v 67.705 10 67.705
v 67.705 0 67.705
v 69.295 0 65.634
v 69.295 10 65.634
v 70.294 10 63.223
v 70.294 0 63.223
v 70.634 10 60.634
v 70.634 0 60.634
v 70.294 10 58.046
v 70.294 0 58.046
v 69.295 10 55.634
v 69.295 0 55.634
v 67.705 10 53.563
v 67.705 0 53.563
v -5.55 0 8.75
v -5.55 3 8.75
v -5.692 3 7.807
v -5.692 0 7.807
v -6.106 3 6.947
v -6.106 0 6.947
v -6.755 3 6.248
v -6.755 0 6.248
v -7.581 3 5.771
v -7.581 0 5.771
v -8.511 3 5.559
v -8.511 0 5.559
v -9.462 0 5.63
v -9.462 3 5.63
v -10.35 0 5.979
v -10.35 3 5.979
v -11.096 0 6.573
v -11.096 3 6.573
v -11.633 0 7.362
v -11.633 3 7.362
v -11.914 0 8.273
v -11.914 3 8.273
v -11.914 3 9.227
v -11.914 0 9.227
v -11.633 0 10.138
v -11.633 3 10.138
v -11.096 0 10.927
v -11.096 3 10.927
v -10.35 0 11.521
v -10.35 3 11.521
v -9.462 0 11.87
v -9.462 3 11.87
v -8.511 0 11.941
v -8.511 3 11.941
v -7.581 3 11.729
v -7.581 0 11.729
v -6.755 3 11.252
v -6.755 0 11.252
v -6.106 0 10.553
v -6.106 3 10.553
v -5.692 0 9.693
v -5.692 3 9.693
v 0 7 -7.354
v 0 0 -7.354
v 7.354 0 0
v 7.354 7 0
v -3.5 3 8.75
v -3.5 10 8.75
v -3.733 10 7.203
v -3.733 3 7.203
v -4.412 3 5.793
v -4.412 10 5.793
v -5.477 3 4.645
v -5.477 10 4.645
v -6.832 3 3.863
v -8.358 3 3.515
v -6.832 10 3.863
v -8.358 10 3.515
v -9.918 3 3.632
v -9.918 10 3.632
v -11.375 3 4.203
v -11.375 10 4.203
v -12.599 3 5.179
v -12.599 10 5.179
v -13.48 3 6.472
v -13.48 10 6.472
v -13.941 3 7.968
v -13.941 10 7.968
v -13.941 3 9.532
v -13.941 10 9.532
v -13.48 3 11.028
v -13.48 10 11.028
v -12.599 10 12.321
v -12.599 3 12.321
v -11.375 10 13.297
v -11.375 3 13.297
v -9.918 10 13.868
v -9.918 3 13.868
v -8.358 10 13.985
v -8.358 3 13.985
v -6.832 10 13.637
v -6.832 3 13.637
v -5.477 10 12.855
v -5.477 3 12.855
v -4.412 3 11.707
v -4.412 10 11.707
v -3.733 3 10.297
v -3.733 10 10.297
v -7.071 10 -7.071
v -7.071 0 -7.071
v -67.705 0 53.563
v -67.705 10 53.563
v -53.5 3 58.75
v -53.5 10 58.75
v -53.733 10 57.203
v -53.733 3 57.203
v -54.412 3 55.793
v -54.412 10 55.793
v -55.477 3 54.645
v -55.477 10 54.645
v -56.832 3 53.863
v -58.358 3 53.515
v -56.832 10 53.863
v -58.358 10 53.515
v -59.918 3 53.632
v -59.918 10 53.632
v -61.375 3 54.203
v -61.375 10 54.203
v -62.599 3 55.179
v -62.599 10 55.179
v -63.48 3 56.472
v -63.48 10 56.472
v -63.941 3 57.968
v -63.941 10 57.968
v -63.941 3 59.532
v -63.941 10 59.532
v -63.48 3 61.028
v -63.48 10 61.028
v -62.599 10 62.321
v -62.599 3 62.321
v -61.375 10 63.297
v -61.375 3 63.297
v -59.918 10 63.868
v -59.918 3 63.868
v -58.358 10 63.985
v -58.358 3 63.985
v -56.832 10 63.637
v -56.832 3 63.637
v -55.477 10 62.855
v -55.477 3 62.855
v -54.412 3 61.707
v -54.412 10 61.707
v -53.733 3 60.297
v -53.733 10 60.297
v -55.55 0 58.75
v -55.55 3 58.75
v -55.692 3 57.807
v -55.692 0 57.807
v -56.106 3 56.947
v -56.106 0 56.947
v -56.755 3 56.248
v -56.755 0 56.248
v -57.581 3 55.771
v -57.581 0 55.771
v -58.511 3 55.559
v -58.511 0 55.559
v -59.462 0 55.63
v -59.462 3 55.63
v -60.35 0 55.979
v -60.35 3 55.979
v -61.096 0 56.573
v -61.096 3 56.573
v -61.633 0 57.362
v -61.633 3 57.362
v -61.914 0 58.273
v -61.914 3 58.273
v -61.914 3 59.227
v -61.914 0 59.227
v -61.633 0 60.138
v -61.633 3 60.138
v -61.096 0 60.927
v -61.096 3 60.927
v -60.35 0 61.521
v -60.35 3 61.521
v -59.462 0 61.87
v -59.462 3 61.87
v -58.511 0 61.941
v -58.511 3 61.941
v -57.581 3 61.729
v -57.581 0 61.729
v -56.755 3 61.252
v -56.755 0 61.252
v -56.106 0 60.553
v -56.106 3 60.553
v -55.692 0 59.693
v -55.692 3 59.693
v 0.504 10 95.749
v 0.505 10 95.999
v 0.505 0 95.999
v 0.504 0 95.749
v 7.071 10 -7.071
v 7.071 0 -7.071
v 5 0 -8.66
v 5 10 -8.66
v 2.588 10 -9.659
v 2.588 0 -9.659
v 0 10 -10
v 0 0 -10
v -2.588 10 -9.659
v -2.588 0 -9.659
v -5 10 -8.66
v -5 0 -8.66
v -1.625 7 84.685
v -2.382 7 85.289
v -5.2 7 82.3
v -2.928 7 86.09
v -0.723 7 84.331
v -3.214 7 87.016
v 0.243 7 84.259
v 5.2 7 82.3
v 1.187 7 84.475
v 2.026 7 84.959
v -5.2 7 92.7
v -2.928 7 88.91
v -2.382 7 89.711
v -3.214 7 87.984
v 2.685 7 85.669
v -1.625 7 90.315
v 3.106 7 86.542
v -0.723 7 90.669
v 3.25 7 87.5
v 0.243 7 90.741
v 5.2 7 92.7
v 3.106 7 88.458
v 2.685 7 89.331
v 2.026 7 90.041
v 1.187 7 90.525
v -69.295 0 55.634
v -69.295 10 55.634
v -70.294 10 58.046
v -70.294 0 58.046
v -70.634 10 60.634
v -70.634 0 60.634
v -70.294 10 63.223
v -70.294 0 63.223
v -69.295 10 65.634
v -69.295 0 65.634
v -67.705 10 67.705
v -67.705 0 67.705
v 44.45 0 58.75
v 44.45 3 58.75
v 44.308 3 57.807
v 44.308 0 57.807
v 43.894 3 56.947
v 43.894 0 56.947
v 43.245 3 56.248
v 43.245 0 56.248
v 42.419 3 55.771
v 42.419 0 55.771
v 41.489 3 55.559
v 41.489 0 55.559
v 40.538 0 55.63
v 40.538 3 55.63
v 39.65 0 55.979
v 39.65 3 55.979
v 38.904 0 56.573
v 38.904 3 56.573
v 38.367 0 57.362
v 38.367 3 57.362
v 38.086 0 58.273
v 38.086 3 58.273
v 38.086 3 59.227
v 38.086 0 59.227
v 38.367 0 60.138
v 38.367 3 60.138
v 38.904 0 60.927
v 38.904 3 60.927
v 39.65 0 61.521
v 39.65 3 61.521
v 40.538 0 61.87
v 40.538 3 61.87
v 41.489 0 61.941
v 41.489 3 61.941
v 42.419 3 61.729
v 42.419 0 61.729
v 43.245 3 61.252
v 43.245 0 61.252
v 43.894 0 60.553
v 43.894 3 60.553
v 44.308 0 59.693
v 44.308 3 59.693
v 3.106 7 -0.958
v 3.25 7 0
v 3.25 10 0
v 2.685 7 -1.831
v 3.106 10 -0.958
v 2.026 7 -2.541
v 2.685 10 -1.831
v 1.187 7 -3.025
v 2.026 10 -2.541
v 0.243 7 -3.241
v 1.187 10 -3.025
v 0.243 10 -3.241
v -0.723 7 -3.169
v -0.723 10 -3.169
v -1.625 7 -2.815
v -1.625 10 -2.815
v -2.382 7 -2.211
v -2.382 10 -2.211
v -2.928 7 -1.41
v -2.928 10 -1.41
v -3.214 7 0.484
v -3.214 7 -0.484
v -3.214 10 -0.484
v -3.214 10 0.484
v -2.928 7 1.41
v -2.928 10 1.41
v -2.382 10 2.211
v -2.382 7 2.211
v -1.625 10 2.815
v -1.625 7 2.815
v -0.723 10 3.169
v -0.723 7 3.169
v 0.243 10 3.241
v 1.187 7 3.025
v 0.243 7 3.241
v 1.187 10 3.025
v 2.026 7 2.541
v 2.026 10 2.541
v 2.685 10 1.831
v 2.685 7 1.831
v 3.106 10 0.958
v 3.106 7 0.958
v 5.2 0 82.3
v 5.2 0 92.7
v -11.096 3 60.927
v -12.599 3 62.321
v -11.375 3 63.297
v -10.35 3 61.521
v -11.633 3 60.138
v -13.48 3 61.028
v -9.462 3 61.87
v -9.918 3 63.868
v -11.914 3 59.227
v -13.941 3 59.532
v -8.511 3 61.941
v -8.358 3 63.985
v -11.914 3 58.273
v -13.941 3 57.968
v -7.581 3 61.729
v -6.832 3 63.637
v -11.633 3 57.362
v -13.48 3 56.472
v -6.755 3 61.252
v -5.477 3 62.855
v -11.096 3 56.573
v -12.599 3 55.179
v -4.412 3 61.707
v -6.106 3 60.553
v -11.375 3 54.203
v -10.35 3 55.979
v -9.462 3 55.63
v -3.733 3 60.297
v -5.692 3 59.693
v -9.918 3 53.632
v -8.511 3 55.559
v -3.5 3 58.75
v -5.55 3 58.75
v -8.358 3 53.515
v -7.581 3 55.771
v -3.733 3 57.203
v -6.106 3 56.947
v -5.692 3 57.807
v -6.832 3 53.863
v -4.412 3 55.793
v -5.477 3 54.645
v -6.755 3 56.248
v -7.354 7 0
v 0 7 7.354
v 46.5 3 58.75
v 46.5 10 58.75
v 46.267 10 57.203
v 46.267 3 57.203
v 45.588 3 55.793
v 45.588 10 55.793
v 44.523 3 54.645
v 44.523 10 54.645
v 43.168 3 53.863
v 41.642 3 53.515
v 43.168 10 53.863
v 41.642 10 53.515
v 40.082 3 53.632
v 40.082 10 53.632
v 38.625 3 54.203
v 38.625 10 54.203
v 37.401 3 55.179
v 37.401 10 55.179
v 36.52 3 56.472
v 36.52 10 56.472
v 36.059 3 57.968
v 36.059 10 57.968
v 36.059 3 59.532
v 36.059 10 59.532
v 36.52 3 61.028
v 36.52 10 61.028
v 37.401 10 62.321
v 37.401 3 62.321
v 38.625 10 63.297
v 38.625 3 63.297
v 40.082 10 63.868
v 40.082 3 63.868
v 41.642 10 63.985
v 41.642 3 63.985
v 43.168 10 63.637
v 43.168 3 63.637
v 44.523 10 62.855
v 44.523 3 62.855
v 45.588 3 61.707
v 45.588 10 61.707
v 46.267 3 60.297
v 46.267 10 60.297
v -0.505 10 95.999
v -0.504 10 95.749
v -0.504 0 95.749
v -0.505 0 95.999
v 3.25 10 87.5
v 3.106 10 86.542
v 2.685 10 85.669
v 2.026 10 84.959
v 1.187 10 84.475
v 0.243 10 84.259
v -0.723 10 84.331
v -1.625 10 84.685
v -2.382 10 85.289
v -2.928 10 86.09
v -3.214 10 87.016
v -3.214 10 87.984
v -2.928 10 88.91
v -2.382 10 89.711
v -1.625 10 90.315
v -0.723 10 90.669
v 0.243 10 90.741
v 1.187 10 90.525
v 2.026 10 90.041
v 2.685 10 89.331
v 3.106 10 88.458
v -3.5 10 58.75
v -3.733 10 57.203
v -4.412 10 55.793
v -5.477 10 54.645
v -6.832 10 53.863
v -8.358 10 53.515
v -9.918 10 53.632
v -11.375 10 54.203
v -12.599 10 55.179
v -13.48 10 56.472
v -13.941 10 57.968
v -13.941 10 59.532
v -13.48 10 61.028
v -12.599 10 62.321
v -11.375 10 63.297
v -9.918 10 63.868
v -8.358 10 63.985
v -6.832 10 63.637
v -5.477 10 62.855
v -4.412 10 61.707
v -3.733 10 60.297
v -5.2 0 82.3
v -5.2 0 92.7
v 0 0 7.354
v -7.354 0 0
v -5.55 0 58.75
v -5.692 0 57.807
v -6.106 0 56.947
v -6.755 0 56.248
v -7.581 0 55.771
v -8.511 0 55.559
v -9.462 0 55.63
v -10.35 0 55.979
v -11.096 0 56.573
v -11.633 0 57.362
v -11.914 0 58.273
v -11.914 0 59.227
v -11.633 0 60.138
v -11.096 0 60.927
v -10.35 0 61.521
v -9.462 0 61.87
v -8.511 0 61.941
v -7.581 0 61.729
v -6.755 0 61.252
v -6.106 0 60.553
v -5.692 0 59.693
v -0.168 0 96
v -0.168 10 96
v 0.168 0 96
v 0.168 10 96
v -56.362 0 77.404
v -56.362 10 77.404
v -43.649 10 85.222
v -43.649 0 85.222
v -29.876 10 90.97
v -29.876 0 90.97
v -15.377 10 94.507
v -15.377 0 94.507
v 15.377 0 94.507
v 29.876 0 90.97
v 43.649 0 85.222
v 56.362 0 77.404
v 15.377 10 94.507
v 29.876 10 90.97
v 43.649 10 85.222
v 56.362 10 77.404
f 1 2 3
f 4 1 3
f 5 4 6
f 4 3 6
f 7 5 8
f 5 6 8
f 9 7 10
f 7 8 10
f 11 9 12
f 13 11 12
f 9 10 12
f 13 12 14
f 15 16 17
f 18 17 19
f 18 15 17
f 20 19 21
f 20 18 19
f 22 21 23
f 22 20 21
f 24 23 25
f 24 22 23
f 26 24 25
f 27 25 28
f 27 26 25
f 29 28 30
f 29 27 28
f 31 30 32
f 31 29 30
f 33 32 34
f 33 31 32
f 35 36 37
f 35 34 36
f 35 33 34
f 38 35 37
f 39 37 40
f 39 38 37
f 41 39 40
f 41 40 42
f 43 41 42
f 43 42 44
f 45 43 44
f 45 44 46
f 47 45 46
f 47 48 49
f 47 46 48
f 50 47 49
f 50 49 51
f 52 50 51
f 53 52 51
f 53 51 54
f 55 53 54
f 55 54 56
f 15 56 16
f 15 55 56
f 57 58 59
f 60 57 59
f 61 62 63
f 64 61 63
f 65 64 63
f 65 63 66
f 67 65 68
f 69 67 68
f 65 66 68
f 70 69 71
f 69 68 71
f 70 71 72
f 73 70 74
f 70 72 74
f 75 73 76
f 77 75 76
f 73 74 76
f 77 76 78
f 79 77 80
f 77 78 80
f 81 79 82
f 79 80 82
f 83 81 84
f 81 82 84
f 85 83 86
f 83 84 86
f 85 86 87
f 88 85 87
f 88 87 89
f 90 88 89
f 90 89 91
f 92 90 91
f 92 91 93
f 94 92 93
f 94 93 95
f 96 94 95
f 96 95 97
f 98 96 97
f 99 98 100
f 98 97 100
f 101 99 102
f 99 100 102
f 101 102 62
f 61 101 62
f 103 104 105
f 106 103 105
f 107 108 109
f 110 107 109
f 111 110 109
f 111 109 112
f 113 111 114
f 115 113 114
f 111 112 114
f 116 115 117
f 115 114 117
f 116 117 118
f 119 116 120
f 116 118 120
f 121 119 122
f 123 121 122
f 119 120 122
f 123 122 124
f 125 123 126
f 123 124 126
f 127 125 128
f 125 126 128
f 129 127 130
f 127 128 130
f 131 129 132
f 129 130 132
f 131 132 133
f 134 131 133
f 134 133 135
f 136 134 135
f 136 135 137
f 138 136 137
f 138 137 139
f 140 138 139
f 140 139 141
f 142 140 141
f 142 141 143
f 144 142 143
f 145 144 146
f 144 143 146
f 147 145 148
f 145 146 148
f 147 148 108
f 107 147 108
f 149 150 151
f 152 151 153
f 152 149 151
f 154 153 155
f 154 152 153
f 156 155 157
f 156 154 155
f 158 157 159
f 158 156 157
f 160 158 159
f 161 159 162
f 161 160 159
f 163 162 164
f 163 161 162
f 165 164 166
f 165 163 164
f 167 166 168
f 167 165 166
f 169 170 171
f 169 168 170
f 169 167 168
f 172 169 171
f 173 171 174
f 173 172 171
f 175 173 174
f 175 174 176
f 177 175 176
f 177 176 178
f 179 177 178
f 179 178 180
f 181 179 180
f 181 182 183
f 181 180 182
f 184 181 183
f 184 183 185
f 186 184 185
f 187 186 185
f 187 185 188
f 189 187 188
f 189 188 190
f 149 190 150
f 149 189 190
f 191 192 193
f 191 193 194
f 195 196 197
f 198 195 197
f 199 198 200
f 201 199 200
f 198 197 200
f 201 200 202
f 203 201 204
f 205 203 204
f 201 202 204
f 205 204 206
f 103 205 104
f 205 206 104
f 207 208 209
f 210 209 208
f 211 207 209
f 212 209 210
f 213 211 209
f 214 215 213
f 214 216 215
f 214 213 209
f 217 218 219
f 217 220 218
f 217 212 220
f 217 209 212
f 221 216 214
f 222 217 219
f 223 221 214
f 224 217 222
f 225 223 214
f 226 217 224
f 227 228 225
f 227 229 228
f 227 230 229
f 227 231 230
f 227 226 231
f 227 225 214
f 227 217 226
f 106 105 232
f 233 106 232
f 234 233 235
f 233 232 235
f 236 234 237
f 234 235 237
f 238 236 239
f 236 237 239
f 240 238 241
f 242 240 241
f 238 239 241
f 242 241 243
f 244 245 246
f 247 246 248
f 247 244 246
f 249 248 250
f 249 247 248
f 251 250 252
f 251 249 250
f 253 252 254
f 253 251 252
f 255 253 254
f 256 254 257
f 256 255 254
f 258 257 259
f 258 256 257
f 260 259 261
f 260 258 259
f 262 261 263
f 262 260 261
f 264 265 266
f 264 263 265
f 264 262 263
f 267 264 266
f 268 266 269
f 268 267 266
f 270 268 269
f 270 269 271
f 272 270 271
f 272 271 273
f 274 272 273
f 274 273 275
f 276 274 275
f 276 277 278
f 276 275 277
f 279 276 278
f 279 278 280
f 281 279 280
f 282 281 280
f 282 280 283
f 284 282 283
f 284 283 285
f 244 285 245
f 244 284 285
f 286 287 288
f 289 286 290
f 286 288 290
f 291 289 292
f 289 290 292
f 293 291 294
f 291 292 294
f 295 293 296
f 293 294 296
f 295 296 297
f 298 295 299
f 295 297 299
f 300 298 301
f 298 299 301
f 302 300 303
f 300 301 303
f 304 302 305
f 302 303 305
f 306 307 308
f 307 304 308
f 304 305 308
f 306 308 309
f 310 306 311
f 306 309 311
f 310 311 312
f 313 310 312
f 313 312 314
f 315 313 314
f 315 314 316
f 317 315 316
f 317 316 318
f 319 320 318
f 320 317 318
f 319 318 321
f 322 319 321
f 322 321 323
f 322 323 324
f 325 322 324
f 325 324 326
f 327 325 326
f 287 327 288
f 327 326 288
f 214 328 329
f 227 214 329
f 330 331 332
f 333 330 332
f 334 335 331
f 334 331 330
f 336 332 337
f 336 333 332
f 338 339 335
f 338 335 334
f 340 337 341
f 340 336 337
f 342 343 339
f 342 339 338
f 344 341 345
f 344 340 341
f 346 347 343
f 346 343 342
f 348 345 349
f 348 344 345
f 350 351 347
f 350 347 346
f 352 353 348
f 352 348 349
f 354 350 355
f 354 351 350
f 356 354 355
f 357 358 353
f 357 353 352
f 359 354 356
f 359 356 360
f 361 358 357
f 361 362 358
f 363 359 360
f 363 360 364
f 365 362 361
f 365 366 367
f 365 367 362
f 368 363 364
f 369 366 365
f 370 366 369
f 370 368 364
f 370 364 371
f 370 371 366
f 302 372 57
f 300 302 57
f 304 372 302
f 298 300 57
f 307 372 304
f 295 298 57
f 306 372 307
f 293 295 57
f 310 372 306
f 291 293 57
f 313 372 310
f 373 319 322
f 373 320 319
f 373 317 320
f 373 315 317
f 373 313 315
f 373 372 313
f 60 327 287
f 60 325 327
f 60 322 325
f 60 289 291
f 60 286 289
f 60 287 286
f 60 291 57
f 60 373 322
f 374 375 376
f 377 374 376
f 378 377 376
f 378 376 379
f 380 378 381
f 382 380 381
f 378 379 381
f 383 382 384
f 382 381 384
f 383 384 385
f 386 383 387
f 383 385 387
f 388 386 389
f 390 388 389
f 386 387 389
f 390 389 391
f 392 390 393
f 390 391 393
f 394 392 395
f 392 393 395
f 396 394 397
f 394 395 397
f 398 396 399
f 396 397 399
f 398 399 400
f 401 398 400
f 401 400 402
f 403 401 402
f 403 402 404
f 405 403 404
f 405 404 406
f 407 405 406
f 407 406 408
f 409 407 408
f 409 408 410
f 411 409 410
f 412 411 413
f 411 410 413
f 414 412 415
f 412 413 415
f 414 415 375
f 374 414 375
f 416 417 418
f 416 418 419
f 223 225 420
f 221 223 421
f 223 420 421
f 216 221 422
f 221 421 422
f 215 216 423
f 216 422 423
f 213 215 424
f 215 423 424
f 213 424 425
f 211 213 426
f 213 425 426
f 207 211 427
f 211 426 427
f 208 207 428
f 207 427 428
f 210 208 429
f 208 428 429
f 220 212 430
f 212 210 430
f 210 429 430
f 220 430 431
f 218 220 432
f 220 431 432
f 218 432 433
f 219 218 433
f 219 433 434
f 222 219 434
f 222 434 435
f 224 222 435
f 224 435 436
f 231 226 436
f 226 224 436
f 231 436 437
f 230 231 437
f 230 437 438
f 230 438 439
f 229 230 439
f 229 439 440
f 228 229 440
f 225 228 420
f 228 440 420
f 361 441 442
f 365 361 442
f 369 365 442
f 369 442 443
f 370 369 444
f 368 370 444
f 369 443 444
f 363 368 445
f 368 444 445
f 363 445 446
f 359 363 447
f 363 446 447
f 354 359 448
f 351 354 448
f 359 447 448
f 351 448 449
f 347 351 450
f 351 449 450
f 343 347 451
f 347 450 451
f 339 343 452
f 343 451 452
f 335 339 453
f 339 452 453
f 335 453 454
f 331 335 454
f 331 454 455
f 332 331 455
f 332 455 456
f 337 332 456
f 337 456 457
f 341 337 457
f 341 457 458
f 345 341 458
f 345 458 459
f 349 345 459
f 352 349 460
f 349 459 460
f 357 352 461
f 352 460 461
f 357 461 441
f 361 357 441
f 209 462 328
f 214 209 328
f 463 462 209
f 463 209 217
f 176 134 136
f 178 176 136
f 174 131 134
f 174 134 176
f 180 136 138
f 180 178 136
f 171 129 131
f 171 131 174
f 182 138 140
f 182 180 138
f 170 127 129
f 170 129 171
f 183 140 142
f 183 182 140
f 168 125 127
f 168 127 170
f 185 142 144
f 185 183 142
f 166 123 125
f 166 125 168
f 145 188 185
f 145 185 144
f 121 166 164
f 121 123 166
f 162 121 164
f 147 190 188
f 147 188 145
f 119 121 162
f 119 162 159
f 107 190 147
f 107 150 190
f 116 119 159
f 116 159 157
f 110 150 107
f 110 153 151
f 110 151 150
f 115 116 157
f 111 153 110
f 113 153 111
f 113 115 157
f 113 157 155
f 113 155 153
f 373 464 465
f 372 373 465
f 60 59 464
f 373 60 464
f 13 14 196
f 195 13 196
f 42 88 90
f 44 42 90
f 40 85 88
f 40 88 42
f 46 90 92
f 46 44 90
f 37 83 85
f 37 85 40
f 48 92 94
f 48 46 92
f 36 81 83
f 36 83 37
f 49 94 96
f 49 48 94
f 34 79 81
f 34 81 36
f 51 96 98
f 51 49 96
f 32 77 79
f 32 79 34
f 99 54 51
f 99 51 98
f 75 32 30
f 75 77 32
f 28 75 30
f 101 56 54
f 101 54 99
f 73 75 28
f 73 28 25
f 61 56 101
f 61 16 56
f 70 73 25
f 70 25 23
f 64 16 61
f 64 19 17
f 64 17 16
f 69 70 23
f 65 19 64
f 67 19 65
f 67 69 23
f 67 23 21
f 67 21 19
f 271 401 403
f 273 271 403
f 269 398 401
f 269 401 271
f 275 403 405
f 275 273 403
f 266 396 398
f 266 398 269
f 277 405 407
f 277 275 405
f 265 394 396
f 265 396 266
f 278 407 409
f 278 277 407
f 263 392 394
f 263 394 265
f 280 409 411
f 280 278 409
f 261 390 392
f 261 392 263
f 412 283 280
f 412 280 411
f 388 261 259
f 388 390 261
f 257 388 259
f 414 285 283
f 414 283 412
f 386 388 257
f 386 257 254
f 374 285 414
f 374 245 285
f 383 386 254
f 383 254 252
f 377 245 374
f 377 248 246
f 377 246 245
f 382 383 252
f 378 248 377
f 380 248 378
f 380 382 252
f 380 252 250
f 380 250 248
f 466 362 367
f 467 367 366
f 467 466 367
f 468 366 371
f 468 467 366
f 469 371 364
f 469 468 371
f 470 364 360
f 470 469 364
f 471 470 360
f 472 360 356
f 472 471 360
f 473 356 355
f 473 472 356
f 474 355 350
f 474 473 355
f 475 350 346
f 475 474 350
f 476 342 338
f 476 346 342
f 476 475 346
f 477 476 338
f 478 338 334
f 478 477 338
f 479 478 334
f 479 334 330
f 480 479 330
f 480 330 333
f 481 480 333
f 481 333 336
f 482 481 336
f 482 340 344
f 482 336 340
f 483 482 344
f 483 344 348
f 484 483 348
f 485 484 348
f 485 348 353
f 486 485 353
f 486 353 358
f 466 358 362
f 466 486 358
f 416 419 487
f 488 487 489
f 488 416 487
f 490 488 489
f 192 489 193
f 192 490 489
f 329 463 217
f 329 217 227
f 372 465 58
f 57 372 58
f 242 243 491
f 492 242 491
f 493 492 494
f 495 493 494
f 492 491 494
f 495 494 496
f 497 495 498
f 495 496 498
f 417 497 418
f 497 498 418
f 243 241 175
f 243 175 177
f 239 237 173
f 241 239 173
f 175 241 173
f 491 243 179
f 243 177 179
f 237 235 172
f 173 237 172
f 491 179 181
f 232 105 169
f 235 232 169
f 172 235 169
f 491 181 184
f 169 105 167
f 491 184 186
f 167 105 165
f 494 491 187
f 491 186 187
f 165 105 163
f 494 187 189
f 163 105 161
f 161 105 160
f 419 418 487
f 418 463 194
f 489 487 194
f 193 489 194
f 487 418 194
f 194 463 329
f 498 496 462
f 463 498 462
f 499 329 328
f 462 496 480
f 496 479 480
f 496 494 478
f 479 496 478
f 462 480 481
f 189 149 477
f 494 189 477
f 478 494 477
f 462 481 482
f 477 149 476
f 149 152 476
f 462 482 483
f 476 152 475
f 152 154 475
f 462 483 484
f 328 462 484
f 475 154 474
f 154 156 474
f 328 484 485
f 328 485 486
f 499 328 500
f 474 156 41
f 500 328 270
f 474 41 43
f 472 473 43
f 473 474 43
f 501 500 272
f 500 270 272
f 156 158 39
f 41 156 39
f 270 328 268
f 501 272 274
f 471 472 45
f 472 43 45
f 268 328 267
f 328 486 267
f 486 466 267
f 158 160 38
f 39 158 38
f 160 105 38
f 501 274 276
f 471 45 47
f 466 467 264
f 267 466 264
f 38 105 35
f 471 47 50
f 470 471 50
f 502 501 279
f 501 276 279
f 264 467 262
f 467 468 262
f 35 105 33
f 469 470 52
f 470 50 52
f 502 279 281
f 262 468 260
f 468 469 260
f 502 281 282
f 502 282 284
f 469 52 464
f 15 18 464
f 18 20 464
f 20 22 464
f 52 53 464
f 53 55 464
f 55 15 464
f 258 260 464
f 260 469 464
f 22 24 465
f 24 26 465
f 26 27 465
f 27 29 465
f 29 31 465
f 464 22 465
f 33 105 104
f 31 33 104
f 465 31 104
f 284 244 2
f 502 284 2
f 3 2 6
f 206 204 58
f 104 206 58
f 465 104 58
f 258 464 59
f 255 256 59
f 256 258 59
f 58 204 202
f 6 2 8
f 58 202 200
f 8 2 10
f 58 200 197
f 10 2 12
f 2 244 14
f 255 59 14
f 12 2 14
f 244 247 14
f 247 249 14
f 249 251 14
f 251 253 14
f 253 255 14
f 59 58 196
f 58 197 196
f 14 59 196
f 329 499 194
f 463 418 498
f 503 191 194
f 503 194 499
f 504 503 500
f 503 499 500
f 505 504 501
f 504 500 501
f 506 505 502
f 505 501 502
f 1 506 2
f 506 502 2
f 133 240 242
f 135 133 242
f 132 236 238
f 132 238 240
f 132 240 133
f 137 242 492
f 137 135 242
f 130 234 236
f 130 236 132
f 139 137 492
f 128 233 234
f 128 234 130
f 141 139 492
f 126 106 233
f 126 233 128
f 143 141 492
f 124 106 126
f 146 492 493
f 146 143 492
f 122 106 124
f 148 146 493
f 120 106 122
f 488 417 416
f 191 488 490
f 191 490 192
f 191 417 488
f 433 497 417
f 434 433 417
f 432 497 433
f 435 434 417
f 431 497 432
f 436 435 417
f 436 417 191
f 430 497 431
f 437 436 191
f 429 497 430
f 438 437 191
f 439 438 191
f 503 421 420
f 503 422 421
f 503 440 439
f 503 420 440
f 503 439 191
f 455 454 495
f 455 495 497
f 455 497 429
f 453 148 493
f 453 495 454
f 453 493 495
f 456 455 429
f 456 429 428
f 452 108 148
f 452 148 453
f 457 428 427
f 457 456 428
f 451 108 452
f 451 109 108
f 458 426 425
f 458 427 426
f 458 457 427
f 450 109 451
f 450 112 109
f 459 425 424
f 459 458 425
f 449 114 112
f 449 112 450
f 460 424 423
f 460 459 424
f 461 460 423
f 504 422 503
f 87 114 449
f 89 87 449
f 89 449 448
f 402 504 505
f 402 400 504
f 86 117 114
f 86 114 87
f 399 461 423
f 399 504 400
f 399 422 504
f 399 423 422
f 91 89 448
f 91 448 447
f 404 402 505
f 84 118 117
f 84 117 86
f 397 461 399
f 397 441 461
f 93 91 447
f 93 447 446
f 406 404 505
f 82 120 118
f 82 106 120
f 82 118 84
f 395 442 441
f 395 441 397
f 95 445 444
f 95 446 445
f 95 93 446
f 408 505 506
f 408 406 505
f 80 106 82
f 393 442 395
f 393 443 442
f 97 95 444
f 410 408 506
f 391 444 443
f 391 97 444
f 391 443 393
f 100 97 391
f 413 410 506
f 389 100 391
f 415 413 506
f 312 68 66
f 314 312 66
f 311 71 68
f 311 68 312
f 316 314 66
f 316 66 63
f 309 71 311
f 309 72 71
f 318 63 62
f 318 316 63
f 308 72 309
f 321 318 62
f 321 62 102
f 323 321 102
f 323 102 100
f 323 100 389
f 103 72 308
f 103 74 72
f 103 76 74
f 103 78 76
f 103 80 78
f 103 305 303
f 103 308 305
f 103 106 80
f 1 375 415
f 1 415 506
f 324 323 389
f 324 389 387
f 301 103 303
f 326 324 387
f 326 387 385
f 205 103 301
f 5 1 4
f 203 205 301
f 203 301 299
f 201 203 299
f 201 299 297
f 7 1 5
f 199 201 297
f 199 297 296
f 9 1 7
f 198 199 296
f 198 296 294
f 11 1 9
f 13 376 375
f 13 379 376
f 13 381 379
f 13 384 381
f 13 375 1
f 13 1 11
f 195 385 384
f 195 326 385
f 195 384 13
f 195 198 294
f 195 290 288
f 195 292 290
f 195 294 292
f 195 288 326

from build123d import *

# Parameters (mm, degrees)
SKETCH_1_R          = 3.2
EXTRUDE_1_DEPTH     = 10
SKETCH_2_R          = 5.25
CUT_EXTRUDE_1_DEPTH = 7
SKETCH_3_R          = 3.25
CUT_EXTRUDE_2_DEPTH = 10
SKETCH_4_R          = 3.25
SKETCH_4_W          = 10.4
SKETCH_4_H          = 10.4
CUT_EXTRUDE_3_DEPTH = 7
EXTRUDE_2_DEPTH     = 10


with BuildPart() as part:
    # 스케치1 → 보스-돌출1 (new body)
    with BuildSketch(Plane(origin=(0, 0, 0), x_dir=(1, 0, 0), z_dir=(0, 1, 0))):
        with BuildLine():
            Line((-7.071067812, 7.071067812), (-67.705474299, -53.563338675))
            ThreePointArc((-67.705474299, -53.563338675), (-70.634406487, -60.634406487), (-67.705474299, -67.705474299))
            ThreePointArc((-67.705474299, -67.705474299), (0, -95.75), (67.705474299, -67.705474299))
            ThreePointArc((67.705474299, -67.705474299), (70.634406487, -60.634406487), (67.705474299, -53.563338675))
            Line((67.705474299, -53.563338675), (7.071067812, 7.071067812))
            ThreePointArc((7.071067812, 7.071067812), (0, 10), (-7.071067812, 7.071067812))
        make_face()
        with Locations((-8.75, -58.75)):
            Circle(SKETCH_1_R, mode=Mode.SUBTRACT)
        with Locations((-8.75, -8.75)):
            Circle(SKETCH_1_R, mode=Mode.SUBTRACT)
        with Locations((-58.75, -58.75)):
            Circle(SKETCH_1_R, mode=Mode.SUBTRACT)
        with Locations((41.25, -58.75)):
            Circle(SKETCH_1_R, mode=Mode.SUBTRACT)
    extrude(amount=EXTRUDE_1_DEPTH)

    # 스케치2 → 컷-돌출1 (cut)
    with BuildSketch(Plane(origin=(0, 10, 0), x_dir=(1, 0, 0), z_dir=(0, 1, 0))):
        with Locations((-8.75, -8.75)):
            Circle(SKETCH_2_R)
        with Locations((-58.75, -58.75)):
            Circle(SKETCH_2_R)
        with Locations((41.25, -58.75)):
            Circle(SKETCH_2_R)
        with Locations((-8.75, -58.75)):
            Circle(SKETCH_2_R)
    extrude(amount=-CUT_EXTRUDE_1_DEPTH, mode=Mode.SUBTRACT)

    # 스케치3 → 컷-돌출2 (cut)
    with BuildSketch(Plane(origin=(0, 10, 0), x_dir=(1, 0, 0), z_dir=(0, 1, 0))):
        Circle(SKETCH_3_R)
        with Locations((0, -87.5)):
            Circle(SKETCH_3_R)
    extrude(amount=-CUT_EXTRUDE_2_DEPTH, mode=Mode.SUBTRACT)

    # 스케치4 → 컷-돌출3 (cut)
    with BuildSketch(Plane.XZ):
        Polygon((0, 7.353910524), (-7.353910524, 0), (0, -7.353910524), (7.353910524, 0), align=None)
        Circle(SKETCH_4_R, mode=Mode.SUBTRACT)
        with Locations((0, 87.5)):
            Rectangle(SKETCH_4_W, SKETCH_4_H)
        with Locations((0, 87.5)):
            Circle(SKETCH_4_R, mode=Mode.SUBTRACT)
    extrude(amount=-CUT_EXTRUDE_3_DEPTH, mode=Mode.SUBTRACT)

    # 스케치5 → 보스-돌출2 (add)
    with BuildSketch(Plane(origin=(0, 10, 0), x_dir=(1, 0, 0), z_dir=(0, 1, 0))):
        with BuildLine():
            Line((0.505263158, -95.998670351), (0.5, -94.998684201))
            ThreePointArc((0.5, -94.998684201), (0, -95), (-0.5, -94.998684201))
            Line((-0.5, -94.998684201), (-0.505263158, -95.998670351))
            ThreePointArc((-0.505263158, -95.998670351), (0, -96), (0.505263158, -95.998670351))
        make_face()
    extrude(amount=-EXTRUDE_2_DEPTH)


solid = part.part
